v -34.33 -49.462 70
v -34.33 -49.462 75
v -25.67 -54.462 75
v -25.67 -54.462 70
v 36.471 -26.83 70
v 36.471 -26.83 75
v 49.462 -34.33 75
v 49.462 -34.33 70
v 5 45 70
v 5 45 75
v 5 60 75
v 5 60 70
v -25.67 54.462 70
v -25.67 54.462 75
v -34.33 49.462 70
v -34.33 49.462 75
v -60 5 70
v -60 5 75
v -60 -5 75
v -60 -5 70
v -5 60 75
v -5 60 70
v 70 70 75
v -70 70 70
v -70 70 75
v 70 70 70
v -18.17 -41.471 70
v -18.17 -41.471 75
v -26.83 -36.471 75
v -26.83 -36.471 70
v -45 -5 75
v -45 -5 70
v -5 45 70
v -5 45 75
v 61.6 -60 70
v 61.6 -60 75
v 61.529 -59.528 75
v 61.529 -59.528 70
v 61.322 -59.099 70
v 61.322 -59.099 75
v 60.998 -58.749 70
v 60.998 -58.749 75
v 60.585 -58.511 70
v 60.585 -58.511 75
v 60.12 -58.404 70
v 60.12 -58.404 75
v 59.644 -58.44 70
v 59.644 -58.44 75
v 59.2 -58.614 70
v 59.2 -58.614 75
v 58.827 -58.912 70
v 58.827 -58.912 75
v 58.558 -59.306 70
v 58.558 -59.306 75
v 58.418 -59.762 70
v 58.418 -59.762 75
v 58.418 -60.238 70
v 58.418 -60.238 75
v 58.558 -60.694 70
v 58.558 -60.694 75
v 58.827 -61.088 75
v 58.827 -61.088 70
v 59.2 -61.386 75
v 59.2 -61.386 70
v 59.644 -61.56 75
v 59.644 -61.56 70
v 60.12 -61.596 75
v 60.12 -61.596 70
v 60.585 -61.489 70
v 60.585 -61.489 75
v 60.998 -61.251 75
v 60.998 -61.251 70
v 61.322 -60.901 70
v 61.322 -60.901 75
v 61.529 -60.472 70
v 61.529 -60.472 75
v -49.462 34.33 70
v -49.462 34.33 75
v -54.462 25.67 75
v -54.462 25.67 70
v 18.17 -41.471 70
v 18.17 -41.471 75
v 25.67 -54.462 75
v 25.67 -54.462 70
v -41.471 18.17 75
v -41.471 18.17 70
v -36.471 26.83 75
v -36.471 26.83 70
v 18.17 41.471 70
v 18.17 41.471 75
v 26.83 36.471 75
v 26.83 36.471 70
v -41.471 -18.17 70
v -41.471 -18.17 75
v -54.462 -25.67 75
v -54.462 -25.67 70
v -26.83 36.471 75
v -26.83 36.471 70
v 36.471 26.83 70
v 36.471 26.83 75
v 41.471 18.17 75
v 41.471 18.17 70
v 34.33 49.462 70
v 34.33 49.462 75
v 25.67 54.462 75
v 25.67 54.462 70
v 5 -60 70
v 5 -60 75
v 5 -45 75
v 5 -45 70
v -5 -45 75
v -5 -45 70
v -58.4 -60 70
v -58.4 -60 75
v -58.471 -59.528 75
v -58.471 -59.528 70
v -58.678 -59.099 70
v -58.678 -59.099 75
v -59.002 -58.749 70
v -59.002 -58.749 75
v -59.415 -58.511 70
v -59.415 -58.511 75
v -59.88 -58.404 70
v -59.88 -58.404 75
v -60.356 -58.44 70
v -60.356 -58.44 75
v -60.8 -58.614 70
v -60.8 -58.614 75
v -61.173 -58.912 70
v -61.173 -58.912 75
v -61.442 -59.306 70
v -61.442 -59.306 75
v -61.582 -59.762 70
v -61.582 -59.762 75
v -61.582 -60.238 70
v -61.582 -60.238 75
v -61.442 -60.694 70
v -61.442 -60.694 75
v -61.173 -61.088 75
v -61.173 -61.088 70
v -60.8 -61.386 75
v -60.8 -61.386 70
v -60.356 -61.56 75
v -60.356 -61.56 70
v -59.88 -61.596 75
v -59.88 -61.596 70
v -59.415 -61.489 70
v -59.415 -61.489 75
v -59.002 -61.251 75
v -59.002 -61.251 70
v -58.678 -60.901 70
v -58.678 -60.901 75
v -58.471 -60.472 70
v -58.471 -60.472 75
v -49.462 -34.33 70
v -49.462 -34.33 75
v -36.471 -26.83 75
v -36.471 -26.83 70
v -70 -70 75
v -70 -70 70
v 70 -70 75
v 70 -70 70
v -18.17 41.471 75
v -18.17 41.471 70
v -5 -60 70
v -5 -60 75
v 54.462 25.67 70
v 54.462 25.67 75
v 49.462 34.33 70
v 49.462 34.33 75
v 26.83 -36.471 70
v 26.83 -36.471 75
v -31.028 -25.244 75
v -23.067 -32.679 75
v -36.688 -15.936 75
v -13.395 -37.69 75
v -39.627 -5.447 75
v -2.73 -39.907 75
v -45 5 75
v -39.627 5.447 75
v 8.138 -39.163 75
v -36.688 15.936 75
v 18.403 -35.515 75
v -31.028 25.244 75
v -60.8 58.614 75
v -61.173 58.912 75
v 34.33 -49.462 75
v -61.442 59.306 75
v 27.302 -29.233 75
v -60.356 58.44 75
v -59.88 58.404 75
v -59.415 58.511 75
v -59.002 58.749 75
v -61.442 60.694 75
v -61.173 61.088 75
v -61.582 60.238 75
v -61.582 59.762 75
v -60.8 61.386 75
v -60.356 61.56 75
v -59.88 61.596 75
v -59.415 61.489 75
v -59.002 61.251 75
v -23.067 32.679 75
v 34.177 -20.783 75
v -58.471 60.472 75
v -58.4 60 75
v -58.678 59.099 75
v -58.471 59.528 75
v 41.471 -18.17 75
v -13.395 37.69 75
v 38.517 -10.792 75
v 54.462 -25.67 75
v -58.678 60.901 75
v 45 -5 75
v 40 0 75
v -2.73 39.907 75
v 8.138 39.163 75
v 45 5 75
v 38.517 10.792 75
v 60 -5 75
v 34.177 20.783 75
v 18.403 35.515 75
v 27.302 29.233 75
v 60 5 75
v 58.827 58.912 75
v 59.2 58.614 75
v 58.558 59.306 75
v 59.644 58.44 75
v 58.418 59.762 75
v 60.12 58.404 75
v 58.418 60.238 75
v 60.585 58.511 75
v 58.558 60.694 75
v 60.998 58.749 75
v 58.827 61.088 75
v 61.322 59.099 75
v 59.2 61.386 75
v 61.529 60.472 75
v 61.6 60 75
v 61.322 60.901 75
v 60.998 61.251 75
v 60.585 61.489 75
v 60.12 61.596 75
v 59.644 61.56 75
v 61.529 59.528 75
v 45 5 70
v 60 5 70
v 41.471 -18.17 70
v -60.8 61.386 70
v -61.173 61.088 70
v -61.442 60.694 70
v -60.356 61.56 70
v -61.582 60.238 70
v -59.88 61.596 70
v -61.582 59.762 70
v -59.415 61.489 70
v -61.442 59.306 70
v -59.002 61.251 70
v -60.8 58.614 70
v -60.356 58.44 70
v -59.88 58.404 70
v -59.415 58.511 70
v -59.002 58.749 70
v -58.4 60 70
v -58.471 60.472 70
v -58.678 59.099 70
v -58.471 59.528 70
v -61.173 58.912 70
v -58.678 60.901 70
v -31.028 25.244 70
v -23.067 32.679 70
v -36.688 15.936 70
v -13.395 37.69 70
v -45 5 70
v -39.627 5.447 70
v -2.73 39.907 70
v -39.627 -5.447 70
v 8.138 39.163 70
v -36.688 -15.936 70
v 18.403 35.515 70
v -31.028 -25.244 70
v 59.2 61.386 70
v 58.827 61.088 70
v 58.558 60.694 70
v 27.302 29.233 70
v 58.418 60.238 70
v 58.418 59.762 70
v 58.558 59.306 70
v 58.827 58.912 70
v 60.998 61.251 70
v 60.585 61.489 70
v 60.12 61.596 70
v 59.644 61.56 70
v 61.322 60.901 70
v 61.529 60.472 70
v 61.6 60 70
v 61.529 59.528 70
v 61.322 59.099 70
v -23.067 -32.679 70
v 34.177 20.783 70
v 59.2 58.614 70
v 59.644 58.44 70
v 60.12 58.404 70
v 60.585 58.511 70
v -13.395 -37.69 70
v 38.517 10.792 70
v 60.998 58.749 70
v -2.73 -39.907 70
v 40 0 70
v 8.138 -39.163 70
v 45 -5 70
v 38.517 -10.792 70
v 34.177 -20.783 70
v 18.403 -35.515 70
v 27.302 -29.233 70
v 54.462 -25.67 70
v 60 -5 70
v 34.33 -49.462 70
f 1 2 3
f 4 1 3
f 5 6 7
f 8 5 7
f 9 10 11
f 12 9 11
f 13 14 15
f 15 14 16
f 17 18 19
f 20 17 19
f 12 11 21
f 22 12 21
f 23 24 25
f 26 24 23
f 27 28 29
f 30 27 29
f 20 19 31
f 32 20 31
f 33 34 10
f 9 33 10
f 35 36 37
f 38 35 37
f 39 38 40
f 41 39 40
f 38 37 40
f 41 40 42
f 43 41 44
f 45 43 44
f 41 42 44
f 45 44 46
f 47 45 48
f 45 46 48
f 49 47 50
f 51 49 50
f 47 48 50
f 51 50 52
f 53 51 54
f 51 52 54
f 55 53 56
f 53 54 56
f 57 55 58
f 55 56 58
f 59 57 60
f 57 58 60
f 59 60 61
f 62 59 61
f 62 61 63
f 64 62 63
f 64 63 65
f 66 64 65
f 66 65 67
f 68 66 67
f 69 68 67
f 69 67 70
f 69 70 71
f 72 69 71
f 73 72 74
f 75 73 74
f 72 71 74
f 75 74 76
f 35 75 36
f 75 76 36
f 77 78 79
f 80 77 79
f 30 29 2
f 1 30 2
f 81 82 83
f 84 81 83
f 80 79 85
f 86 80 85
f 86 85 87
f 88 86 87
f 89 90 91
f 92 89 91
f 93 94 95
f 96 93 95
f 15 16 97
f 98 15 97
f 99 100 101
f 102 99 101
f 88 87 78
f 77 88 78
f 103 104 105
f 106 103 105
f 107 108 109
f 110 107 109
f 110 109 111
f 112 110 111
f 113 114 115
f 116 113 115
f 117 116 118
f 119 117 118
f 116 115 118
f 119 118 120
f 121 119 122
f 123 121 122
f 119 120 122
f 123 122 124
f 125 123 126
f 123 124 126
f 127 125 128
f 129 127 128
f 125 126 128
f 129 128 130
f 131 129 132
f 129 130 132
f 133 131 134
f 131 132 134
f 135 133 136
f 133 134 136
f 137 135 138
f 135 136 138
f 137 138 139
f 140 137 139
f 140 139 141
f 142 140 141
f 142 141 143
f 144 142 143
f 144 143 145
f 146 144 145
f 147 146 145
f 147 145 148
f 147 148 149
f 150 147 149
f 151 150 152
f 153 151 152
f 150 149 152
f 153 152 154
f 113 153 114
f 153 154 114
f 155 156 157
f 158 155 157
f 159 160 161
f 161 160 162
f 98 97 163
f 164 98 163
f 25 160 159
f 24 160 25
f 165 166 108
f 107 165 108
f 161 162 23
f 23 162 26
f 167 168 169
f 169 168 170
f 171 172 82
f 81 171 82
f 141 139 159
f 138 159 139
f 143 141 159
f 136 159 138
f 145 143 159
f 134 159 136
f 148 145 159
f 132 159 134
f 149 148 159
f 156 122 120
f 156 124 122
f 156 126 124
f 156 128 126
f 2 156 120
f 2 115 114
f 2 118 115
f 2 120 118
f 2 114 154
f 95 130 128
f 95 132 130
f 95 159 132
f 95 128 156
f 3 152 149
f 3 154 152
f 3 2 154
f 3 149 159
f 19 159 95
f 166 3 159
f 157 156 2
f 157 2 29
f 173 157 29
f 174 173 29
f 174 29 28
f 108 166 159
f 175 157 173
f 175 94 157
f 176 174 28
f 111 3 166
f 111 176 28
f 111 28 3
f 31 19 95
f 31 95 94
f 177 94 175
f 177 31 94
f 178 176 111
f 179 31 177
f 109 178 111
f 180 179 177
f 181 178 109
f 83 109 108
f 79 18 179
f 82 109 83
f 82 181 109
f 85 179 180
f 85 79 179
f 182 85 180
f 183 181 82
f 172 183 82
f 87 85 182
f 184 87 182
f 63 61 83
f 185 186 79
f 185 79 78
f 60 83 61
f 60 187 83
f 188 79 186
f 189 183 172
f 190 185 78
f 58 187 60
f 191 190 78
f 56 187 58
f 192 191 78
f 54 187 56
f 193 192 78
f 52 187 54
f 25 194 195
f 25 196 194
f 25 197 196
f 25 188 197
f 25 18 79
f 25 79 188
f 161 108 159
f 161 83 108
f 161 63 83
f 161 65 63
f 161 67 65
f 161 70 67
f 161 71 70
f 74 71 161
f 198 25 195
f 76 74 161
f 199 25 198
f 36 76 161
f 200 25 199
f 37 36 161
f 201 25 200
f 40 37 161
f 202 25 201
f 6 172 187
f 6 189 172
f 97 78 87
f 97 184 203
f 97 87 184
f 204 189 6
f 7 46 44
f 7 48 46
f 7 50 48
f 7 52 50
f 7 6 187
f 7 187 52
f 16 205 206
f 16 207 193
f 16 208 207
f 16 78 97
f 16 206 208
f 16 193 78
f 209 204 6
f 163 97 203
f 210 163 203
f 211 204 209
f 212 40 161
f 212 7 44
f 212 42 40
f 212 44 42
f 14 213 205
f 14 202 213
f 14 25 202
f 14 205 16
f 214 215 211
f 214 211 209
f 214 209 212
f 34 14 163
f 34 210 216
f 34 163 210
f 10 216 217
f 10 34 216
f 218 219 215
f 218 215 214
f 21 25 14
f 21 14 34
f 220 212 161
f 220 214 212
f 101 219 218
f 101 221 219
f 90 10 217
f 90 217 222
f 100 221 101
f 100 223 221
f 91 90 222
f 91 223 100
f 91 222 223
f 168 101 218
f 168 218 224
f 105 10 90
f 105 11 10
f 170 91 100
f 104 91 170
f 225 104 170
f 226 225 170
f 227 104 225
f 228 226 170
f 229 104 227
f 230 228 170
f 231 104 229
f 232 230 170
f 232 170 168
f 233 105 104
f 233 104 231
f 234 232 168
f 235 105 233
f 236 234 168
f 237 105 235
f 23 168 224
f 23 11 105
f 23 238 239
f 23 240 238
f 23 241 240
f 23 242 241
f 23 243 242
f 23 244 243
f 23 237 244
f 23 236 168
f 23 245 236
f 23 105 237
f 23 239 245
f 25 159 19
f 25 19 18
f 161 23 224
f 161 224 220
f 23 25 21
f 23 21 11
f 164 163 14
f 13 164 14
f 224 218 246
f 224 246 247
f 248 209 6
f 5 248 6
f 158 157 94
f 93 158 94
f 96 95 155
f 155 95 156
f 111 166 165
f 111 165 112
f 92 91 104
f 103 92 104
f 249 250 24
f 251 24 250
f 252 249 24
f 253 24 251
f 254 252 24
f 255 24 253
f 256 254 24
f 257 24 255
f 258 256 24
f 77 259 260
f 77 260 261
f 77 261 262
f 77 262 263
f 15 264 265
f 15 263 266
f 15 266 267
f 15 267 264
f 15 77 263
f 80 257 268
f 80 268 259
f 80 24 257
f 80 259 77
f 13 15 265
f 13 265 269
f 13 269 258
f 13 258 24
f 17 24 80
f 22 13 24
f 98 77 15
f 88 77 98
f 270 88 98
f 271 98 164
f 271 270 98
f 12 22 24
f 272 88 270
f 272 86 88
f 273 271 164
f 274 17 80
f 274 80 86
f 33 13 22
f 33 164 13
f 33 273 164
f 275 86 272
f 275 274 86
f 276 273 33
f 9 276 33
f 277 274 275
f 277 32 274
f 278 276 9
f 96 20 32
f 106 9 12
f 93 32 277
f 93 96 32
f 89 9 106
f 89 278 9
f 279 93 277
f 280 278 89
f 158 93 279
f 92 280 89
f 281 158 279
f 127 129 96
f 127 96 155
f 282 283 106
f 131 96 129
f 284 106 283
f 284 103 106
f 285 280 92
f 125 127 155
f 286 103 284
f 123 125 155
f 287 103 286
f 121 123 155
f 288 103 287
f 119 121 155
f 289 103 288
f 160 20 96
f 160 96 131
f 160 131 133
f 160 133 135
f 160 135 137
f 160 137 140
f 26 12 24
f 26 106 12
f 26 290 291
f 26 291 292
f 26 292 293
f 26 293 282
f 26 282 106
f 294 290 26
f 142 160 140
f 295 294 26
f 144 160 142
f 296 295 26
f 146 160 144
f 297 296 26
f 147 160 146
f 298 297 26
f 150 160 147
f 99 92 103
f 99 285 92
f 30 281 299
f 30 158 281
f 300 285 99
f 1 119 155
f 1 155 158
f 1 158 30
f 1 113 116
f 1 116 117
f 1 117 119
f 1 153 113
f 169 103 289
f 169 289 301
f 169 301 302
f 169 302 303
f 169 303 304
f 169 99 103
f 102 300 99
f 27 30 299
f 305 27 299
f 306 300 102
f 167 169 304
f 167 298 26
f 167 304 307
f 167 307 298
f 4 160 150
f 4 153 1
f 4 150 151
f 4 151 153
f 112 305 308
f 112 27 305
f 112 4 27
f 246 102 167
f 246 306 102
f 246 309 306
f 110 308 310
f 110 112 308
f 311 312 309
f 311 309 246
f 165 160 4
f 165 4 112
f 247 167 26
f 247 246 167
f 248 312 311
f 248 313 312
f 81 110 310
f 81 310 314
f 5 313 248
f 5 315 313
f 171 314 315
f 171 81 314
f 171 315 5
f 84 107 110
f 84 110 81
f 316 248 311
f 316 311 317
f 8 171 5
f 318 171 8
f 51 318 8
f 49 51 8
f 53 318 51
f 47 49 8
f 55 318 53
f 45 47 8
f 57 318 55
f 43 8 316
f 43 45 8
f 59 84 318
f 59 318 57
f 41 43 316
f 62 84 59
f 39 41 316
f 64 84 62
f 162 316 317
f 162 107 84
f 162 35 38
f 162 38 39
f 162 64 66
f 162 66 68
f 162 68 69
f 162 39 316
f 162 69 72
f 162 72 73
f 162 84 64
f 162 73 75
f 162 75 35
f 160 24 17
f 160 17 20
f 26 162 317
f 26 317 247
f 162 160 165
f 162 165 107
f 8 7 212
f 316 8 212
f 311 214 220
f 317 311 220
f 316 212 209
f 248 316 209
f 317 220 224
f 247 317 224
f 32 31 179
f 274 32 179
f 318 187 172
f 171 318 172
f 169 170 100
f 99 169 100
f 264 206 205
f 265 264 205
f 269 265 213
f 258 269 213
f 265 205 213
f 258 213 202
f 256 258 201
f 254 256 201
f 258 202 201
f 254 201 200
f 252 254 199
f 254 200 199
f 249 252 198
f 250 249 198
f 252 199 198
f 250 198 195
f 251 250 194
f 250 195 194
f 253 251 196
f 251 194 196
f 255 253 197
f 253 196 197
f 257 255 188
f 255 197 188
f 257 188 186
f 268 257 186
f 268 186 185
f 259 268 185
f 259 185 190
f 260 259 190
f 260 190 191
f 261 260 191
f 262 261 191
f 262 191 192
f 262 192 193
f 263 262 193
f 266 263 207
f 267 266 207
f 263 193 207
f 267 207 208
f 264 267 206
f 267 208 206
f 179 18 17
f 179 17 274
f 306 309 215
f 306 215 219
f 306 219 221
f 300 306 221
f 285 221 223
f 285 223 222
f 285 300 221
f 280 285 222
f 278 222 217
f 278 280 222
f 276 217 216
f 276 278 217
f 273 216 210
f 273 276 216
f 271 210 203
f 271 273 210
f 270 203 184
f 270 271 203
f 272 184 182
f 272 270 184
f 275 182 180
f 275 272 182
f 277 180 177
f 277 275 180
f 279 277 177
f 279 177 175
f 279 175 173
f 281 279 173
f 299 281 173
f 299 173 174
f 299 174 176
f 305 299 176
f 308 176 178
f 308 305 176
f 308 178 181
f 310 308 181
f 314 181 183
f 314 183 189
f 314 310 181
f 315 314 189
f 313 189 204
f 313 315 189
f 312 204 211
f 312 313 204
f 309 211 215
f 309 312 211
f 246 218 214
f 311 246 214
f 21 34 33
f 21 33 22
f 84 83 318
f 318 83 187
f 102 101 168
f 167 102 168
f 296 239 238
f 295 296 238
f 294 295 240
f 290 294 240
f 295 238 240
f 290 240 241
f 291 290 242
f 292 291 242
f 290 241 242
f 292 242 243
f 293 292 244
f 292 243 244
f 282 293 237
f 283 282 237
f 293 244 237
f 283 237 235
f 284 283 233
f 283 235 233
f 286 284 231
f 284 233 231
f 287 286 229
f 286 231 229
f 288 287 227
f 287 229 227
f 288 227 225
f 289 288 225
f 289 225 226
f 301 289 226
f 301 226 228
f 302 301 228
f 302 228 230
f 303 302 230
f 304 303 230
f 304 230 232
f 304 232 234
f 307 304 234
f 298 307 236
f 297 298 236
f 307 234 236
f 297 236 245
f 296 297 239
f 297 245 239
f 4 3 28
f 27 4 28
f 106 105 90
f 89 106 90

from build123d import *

# Parameters (mm, degrees)
F0_W      = 130
F0_H      = 5
F1_DEPTH  = 70
F2_W      = 140
F2_H      = 140
F3_DEPTH  = 5
F4_W      = 140
F4_H      = 140
F4_R      = 40
F5_DEPTH  = 5
F7_W      = 5
F7_H      = 15
F7_W_2    = 15
F7_H_2    = 5
F8_DEPTH  = 5
F9_W      = 140
F9_H      = 70
F10_DEPTH = 140
F11_R     = 1.6
F12_DEPTH = 5


with BuildPart() as f1:
    # F0 (on Top) → F1 (new body)
    with BuildSketch(Plane.XY):
        with Locations((0, 67.5)):
            Rectangle(F0_W, F0_H)
        Polygon((-65, -65), (-65, 65), (-65, 70), (-70, 70), (-70, -70), (-65, -70), align=None)
        Polygon((65, 70), (65, 65), (65, -65), (65, -70), (70, -70), (70, 70), align=None)
        with Locations((0, -67.5)):
            Rectangle(F0_W, F0_H)
    extrude(amount=F1_DEPTH)

    # F2 (on face) → F3 (join)
    with BuildSketch(Plane(origin=(0, 0, 0), x_dir=(1, 0, 0), z_dir=(0, 0, -1))):
        Rectangle(F2_W, F2_H)
    extrude(amount=-F3_DEPTH)

    # F4 (on face) → F5 (join)
    with BuildSketch(Plane.XY.offset(70)):
        Rectangle(F4_W, F4_H)
        Circle(F4_R, mode=Mode.SUBTRACT)
    extrude(amount=F5_DEPTH)

    # F7 (on face) → F8 (cut, through all)
    with BuildSketch(Plane.XY.offset(75)):
        Polygon((-41.471143, 18.169873), (-38.971143, 22.5), (-51.961524, 30), (-54.461524, 25.669873), align=None)
        Polygon((-51.961524, 30), (-38.971143, 22.5), (-36.471143, 26.830127), (-49.461524, 34.330127), align=None)
        with Locations((-2.5, 52.5)):
            Rectangle(F7_W, F7_H)
        with Locations((2.5, 52.5)):
            Rectangle(F7_W, F7_H)
        Polygon((51.961524, 30), (49.461524, 34.330127), (36.471143, 26.830127), (38.971143, 22.5), align=None)
        Polygon((54.461524, 25.669873), (51.961524, 30), (38.971143, 22.5), (41.471143, 18.169873), align=None)
        Polygon((-26.830127, 36.471143), (-22.5, 38.971143), (-30, 51.961524), (-34.330127, 49.461524), align=None)
        Polygon((-30, 51.961524), (-22.5, 38.971143), (-18.169873, 41.471143), (-25.669873, 54.461524), align=None)
        Polygon((51.961524, -30), (54.461524, -25.669873), (41.471143, -18.169873), (38.971143, -22.5), align=None)
        Polygon((49.461524, -34.330127), (51.961524, -30), (38.971143, -22.5), (36.471143, -26.830127), align=None)
        with Locations((-2.5, -52.5)):
            Rectangle(F7_W, F7_H)
        with Locations((2.5, -52.5)):
            Rectangle(F7_W, F7_H)
        Polygon((-51.961524, -30), (-49.461524, -34.330127), (-36.471143, -26.830127), (-38.971143, -22.5), align=None)
        Polygon((-54.461524, -25.669873), (-51.961524, -30), (-38.971143, -22.5), (-41.471143, -18.169873), align=None)
        Polygon((30, 51.961524), (25.669873, 54.461524), (18.169873, 41.471143), (22.5, 38.971143), align=None)
        Polygon((34.330127, 49.461524), (30, 51.961524), (22.5, 38.971143), (26.830127, 36.471143), align=None)
        with Locations((52.5, 2.5)):
            Rectangle(F7_W_2, F7_H_2)
        with Locations((52.5, -2.5)):
            Rectangle(F7_W_2, F7_H_2)
        Polygon((30, -51.961524), (34.330127, -49.461524), (26.830127, -36.471143), (22.5, -38.971143), align=None)
        Polygon((25.669873, -54.461524), (30, -51.961524), (22.5, -38.971143), (18.169873, -41.471143), align=None)
        Polygon((-26.830127, -36.471143), (-34.330127, -49.461524), (-30, -51.961524), (-22.5, -38.971143), align=None)
        Polygon((-22.5, -38.971143), (-30, -51.961524), (-25.669873, -54.461524), (-18.169873, -41.471143), align=None)
        with Locations((-52.5, 2.5)):
            Rectangle(F7_W_2, F7_H_2)
        with Locations((-52.5, -2.5)):
            Rectangle(F7_W_2, F7_H_2)
    extrude(amount=-F8_DEPTH, mode=Mode.SUBTRACT)

    # F9 (on face) → F10 (cut, through all)
    with BuildSketch(Plane.XZ.offset(70)):
        with Locations((0, 35)):
            Rectangle(F9_W, F9_H)
    extrude(amount=-F10_DEPTH, mode=Mode.SUBTRACT)

    # F11 (on face) → F12 (cut, through all)
    with BuildSketch(Plane.XY.offset(75)):
        with Locations((-60, -60)):
            Circle(F11_R)
        with Locations((-60, 60)):
            Circle(F11_R)
        with Locations((60, -60)):
            Circle(F11_R)
        with Locations((60, 60)):
            Circle(F11_R)
    extrude(amount=-F12_DEPTH, mode=Mode.SUBTRACT)


solid = f1.part
